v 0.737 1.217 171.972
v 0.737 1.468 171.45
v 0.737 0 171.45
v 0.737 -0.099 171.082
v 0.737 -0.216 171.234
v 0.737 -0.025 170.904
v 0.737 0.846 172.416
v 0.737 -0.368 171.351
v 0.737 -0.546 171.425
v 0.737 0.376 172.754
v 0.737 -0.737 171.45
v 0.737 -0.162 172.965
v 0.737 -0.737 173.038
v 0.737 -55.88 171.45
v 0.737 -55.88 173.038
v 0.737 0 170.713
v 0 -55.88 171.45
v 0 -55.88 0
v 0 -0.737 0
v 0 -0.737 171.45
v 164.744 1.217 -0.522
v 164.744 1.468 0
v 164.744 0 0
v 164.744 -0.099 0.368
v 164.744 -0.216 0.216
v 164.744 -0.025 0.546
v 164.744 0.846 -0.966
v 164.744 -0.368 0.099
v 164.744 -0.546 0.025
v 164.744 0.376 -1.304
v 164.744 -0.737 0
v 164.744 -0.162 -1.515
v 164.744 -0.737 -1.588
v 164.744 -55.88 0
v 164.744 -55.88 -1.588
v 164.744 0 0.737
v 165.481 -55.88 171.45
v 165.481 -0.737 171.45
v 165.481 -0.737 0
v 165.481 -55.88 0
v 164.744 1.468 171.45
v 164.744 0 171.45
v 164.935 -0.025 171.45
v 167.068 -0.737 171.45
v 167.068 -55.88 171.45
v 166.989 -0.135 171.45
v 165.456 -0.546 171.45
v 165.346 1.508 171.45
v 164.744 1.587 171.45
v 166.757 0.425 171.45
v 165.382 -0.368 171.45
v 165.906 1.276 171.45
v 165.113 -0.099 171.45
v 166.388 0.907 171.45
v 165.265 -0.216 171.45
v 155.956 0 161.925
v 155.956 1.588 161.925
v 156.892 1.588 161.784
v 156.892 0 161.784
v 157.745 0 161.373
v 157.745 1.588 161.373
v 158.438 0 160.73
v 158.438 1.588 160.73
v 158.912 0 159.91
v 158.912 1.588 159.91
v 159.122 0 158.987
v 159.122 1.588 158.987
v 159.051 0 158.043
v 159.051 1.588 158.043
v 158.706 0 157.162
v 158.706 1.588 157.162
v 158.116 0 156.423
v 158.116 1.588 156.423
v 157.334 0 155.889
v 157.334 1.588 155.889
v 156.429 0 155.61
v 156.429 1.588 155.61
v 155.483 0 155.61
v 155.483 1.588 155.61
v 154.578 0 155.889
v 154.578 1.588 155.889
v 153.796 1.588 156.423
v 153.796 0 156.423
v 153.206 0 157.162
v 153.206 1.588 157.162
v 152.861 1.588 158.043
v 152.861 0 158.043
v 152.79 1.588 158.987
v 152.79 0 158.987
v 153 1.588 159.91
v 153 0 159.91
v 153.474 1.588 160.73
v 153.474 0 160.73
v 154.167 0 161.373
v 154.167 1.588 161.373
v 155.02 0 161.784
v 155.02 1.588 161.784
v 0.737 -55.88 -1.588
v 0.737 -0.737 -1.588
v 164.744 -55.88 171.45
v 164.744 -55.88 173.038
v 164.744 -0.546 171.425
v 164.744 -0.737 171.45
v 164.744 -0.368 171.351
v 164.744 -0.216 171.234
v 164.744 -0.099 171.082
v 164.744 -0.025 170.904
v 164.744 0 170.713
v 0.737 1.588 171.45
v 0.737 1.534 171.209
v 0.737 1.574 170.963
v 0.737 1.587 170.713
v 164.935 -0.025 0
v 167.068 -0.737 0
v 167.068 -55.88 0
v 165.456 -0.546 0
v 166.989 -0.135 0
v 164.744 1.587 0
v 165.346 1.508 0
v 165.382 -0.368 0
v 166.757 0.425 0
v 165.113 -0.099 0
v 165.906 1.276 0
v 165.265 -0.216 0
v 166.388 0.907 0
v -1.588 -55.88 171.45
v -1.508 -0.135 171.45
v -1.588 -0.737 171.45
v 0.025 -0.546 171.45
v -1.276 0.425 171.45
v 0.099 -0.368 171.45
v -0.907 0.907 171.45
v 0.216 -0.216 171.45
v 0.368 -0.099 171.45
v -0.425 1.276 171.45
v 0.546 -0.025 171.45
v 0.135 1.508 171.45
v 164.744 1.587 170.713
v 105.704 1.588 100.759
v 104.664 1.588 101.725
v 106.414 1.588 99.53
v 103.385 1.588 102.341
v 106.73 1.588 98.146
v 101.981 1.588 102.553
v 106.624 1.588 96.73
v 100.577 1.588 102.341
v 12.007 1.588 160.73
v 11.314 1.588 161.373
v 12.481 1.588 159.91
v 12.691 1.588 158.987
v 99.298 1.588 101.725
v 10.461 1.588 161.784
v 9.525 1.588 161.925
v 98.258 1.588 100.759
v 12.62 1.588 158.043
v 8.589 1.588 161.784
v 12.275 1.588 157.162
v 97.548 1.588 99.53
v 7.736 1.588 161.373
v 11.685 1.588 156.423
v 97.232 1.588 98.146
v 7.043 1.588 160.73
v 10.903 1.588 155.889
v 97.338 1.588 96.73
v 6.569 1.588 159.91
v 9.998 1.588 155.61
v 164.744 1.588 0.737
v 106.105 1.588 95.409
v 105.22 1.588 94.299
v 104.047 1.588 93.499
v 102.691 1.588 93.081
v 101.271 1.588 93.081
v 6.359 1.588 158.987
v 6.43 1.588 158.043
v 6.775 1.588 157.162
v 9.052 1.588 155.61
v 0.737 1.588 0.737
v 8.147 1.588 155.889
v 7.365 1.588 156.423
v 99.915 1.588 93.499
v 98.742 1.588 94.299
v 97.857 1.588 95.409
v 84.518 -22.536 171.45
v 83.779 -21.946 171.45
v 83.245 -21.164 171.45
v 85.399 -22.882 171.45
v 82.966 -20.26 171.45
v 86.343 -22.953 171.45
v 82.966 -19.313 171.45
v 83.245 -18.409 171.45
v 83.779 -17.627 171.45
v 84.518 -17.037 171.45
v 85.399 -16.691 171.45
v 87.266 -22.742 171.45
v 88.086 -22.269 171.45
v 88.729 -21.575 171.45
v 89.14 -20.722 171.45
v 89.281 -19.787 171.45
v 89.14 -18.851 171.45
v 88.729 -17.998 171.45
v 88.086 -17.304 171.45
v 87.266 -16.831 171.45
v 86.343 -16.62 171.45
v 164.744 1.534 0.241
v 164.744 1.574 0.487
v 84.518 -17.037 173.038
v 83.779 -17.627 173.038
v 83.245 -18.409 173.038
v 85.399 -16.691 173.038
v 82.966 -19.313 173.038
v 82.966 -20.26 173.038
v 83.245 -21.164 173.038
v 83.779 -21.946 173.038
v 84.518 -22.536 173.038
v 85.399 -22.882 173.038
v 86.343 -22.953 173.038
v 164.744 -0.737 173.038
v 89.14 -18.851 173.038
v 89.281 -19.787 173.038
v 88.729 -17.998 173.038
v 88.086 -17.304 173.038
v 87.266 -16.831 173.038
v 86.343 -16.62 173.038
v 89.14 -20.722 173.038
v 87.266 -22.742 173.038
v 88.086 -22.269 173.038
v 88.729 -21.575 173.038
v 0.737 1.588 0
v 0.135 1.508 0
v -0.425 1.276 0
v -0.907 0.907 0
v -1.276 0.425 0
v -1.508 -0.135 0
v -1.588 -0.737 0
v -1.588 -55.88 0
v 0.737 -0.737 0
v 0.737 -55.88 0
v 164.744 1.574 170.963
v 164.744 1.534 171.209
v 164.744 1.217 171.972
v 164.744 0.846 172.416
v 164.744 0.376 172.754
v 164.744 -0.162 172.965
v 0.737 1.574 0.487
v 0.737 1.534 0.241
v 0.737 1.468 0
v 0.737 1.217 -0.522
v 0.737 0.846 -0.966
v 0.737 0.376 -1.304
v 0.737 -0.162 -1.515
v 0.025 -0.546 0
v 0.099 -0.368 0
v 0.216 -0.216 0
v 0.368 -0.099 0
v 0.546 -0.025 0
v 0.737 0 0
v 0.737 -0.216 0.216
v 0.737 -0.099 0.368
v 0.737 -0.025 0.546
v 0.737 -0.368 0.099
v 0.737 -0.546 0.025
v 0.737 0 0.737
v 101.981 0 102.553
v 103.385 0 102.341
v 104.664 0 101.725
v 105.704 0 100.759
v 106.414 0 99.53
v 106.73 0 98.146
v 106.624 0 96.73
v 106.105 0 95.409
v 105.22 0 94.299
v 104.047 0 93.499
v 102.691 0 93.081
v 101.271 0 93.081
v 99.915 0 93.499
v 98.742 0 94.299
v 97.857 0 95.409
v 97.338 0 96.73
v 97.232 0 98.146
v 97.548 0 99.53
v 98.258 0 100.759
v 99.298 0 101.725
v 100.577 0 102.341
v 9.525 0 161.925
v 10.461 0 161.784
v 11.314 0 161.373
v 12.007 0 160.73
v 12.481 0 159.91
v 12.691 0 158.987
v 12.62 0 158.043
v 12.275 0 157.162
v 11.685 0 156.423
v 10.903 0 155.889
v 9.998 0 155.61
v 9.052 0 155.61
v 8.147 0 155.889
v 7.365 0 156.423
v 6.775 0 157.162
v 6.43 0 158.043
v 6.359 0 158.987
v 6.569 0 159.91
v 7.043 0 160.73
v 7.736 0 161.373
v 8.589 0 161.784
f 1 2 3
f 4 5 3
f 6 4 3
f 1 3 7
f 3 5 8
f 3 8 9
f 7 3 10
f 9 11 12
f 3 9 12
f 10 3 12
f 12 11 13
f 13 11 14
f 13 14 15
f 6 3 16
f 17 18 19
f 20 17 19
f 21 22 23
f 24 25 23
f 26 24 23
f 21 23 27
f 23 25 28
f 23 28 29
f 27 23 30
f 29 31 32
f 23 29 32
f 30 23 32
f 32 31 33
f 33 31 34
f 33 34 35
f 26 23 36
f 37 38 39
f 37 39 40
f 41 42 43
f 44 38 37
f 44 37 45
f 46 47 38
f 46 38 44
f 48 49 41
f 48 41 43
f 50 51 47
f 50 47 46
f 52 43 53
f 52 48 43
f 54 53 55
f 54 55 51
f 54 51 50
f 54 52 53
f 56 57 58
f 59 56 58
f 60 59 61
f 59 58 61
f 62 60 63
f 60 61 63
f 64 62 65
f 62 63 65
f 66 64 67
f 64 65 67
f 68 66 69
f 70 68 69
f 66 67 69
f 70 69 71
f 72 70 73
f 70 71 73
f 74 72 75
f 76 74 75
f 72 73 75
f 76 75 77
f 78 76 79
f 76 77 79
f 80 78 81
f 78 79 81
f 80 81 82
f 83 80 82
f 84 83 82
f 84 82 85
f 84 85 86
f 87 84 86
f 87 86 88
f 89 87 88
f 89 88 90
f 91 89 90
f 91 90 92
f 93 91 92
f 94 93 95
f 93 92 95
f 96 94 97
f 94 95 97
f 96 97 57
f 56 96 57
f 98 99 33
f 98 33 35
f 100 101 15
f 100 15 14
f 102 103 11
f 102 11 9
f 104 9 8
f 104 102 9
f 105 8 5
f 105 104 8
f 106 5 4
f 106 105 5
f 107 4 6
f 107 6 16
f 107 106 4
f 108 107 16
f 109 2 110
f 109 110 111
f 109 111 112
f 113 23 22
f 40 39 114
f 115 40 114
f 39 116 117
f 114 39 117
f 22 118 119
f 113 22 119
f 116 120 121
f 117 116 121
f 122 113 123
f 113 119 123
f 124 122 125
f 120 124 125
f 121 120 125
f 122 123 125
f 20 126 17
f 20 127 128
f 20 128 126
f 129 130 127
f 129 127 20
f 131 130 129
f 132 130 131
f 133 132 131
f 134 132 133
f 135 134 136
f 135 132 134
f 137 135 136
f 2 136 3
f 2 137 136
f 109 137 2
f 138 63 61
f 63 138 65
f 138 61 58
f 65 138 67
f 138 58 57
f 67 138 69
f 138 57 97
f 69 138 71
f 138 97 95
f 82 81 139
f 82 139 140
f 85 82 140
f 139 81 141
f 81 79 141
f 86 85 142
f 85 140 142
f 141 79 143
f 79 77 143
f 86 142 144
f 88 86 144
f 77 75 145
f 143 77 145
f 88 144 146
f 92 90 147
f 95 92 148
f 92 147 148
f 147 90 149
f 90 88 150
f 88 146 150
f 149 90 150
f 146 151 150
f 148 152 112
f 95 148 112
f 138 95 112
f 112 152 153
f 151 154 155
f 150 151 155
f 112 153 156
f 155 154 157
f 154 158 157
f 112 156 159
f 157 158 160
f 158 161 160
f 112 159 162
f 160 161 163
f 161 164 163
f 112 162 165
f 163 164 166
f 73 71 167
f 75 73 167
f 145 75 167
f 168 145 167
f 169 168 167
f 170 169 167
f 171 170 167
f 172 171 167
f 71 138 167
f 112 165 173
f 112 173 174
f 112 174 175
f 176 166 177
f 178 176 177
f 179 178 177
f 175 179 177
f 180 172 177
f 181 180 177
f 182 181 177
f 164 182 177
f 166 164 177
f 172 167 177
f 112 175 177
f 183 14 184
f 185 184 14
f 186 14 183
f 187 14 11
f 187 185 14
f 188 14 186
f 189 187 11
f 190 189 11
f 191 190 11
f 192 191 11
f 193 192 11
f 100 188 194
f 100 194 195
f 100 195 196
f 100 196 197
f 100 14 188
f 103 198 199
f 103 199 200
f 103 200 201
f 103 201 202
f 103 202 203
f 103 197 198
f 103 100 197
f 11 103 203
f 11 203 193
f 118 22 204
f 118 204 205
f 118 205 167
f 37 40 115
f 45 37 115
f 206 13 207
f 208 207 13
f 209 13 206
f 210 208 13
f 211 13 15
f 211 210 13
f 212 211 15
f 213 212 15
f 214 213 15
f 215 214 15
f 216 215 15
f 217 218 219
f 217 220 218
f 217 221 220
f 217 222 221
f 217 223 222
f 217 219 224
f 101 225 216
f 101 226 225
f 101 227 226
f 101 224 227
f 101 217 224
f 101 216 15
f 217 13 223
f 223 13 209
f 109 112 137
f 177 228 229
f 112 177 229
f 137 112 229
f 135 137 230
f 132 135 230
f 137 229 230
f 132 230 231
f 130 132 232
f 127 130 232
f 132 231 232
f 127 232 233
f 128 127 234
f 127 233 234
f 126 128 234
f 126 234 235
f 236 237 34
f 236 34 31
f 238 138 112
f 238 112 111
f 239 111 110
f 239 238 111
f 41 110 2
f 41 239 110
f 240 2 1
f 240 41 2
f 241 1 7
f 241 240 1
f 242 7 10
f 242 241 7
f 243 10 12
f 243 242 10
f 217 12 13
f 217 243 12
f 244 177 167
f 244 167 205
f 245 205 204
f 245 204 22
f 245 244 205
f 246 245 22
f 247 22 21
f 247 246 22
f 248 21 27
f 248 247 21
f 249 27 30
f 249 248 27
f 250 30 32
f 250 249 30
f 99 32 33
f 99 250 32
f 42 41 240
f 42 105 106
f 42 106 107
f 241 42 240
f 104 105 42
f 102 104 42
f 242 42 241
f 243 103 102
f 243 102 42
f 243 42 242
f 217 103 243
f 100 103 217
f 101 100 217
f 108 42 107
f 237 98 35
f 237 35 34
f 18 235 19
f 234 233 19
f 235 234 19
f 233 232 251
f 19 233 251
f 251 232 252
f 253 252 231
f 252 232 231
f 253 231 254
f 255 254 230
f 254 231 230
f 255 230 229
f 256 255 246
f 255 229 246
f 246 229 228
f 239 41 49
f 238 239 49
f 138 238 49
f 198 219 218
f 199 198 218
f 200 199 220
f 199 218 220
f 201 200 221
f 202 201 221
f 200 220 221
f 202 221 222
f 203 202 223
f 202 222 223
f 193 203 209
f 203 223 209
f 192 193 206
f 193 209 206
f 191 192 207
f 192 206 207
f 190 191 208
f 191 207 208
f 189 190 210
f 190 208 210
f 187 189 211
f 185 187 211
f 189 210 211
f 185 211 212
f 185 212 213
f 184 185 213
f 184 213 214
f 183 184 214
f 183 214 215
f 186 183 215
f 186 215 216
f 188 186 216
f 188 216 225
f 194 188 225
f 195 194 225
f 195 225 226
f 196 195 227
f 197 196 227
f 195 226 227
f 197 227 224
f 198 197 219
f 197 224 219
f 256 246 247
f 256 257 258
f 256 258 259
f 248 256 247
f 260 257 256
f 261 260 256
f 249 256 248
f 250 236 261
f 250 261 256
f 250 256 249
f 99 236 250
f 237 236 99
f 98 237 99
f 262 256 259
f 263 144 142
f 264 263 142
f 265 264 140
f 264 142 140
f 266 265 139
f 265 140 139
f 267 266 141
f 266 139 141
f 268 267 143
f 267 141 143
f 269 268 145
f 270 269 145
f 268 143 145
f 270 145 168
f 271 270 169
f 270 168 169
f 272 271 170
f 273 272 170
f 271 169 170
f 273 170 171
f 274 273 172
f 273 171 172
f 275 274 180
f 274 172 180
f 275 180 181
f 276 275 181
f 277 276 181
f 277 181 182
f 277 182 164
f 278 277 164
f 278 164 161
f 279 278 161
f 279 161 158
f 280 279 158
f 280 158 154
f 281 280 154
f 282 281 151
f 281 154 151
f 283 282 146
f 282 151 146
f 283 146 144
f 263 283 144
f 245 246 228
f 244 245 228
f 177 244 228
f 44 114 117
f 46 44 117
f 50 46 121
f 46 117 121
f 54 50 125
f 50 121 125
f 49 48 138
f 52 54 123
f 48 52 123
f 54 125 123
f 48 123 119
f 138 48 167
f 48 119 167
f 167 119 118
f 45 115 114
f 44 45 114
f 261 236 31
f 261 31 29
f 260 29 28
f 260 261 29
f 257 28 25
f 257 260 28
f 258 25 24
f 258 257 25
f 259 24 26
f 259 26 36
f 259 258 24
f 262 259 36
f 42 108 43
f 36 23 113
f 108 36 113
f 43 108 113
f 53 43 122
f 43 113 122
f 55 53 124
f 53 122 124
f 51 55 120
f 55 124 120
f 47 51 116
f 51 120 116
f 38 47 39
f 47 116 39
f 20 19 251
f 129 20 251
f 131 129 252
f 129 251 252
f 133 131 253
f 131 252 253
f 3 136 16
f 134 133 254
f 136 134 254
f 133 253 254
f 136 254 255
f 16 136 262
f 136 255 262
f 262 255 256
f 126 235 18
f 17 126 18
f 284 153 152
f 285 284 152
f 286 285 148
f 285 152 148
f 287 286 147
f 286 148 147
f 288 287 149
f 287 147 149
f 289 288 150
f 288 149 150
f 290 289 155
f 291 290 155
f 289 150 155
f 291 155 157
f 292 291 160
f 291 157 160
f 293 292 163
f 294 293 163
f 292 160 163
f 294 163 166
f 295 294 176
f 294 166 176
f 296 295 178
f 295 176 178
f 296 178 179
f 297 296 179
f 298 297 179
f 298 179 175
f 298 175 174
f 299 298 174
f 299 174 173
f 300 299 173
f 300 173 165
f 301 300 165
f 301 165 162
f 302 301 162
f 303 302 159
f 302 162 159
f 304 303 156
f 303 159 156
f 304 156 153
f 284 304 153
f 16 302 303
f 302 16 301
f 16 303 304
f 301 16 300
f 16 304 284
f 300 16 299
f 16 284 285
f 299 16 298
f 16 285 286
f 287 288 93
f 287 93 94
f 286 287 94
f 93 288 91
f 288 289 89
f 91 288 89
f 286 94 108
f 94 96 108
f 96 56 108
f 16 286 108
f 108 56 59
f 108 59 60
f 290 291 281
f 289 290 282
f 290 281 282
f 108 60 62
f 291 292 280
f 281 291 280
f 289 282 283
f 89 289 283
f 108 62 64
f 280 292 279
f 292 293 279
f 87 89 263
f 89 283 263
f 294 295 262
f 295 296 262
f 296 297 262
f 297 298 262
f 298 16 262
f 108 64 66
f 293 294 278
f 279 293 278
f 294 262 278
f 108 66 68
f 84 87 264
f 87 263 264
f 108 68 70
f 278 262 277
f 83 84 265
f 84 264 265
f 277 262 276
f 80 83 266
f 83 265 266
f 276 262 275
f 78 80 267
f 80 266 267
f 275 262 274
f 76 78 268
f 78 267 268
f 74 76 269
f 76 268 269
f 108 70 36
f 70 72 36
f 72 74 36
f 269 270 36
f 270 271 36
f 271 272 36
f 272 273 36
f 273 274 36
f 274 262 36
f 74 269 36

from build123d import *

# Parameters (mm, degrees)
BASE_FLANGE1_DEPTH           = 171.45
SKETCH4_R                    = 4.7625
CUT_EXTRUDE1_DEPTH           = 1.5875
EDGE_FLANGE2_STRIP_W         = 7.8232
EDGE_FLANGE2_STRIP_H         = 1.5875
EDGE_FLANGE2_STRIP_CUT_DEPTH = 164.0078
EDGE_FLANGE2_DEPTH           = 164.0078
EDGE_FLANGE3_STRIP_W         = 7.8232
EDGE_FLANGE3_STRIP_H         = 1.5875
EDGE_FLANGE3_STRIP_CUT_DEPTH = 164.0078
EDGE_FLANGE3_DEPTH           = 164.0078
SKETCH14_R                   = 3.175
CUT_EXTRUDE2_DEPTH           = 1.5875
SKETCH17_R                   = 3.175
CUT_EXTRUDE5_DEPTH           = 1.5875


# Sheet-metal steps are written as plain solids
with BuildPart() as part:
    # Sketch1 → Base-Flange1 (new body)
    with BuildSketch(Plane.XY):
        with BuildLine():
            Line((0, -55.88), (0, -0.7366))
            ThreePointArc((0, -0.7366), (0.215745145, -0.215745145), (0.7366, 0))
            Line((0.7366, 0), (164.7444, 0))
            ThreePointArc((164.7444, 0), (165.265254855, -0.215745145), (165.481, -0.7366))
            Line((165.481, -0.7366), (165.481, -55.88))
            Line((165.481, -55.88), (167.0685, -55.88))
            Line((167.0685, -55.88), (167.0685, -0.7366))
            ThreePointArc((167.0685, -0.7366), (166.38778687, 0.90678687), (164.7444, 1.5875))
            Line((164.7444, 1.5875), (0.7366, 1.5875))
            ThreePointArc((0.7366, 1.5875), (-0.90678687, 0.90678687), (-1.5875, -0.7366))
            Line((-1.5875, -0.7366), (-1.5875, -55.88))
            Line((-1.5875, -55.88), (0, -55.88))
        make_face()
    extrude(amount=BASE_FLANGE1_DEPTH)

    # Sketch4 → Cut-Extrude1 (cut)
    with BuildSketch(Plane(origin=(0, 1.5875, 0), x_dir=(1, 0, 0), z_dir=(0, 1, 0))):
        with Locations(Location((101.981, -97.79, 0), (0, 0, 270))):
            Circle(SKETCH4_R)
    extrude(amount=-CUT_EXTRUDE1_DEPTH, mode=Mode.SUBTRACT)

    # Edge-Flange2 strip (across the edge) → Edge-Flange2 strip cut (cut)
    with BuildSketch(Plane(origin=(164.7444, 0, 171.45), x_dir=(0, 0, -1), z_dir=(-1, 0, 0))):
        with Locations((-3.175, -0.79375)):
            Rectangle(EDGE_FLANGE2_STRIP_W, EDGE_FLANGE2_STRIP_H)
    extrude(amount=EDGE_FLANGE2_STRIP_CUT_DEPTH, mode=Mode.SUBTRACT)

    # Edge-Flange2 section (across the edge) → Edge-Flange2 (add)
    with BuildSketch(Plane(origin=(164.7444, 0, 171.45), x_dir=(0, 0, -1), z_dir=(-1, 0, 0))):
        with BuildLine():
            Line((-1.5875, 0.7366), (-1.5875, 55.88))
            Line((-1.5875, 55.88), (0, 55.88))
            Line((0, 55.88), (0, 0.7366))
            ThreePointArc((0, 0.7366), (0.215745145, 0.215745145), (0.7366, 0))
            Line((0.7366, 0), (0.7366, -1.5875))
            ThreePointArc((0.7366, -1.5875), (-0.90678687, -0.90678687), (-1.5875, 0.7366))
        make_face()
    extrude(amount=EDGE_FLANGE2_DEPTH)

    # Edge-Flange3 strip (across the edge) → Edge-Flange3 strip cut (cut)
    with BuildSketch(Plane(origin=(0.7366, 0, 0), x_dir=(0, 0, 1), z_dir=(1, 0, 0))):
        with Locations((-3.175, -0.79375)):
            Rectangle(EDGE_FLANGE3_STRIP_W, EDGE_FLANGE3_STRIP_H)
    extrude(amount=EDGE_FLANGE3_STRIP_CUT_DEPTH, mode=Mode.SUBTRACT)

    # Edge-Flange3 section (across the edge) → Edge-Flange3 (add)
    with BuildSketch(Plane(origin=(0.7366, 0, 0), x_dir=(0, 0, 1), z_dir=(1, 0, 0))):
        with BuildLine():
            Line((-1.5875, 0.7366), (-1.5875, 55.88))
            Line((-1.5875, 55.88), (0, 55.88))
            Line((0, 55.88), (0, 0.7366))
            ThreePointArc((0, 0.7366), (0.215745145, 0.215745145), (0.7366, 0))
            Line((0.7366, 0), (0.7366, -1.5875))
            ThreePointArc((0.7366, -1.5875), (-0.90678687, -0.90678687), (-1.5875, 0.7366))
        make_face()
    extrude(amount=EDGE_FLANGE3_DEPTH)

    # Sketch14 → Cut-Extrude2 (cut)
    with BuildSketch(Plane(origin=(0, 1.5875, 0), x_dir=(1, 0, 0), z_dir=(0, 1, 0))):
        with Locations(Location((155.956, -158.75, 0), (0, 0, 270))):
            Circle(SKETCH14_R)
        with Locations(Location((9.525, -158.75, 0), (0, 0, 270))):
            Circle(SKETCH14_R)
    extrude(amount=-CUT_EXTRUDE2_DEPTH, mode=Mode.SUBTRACT)

    # Sketch17 → Cut-Extrude5 (cut)
    with BuildSketch(Plane.XY.offset(173.0375)):
        with Locations((86.106, -19.7866)):
            Circle(SKETCH17_R)
    extrude(amount=-CUT_EXTRUDE5_DEPTH, mode=Mode.SUBTRACT)


solid = part.part
